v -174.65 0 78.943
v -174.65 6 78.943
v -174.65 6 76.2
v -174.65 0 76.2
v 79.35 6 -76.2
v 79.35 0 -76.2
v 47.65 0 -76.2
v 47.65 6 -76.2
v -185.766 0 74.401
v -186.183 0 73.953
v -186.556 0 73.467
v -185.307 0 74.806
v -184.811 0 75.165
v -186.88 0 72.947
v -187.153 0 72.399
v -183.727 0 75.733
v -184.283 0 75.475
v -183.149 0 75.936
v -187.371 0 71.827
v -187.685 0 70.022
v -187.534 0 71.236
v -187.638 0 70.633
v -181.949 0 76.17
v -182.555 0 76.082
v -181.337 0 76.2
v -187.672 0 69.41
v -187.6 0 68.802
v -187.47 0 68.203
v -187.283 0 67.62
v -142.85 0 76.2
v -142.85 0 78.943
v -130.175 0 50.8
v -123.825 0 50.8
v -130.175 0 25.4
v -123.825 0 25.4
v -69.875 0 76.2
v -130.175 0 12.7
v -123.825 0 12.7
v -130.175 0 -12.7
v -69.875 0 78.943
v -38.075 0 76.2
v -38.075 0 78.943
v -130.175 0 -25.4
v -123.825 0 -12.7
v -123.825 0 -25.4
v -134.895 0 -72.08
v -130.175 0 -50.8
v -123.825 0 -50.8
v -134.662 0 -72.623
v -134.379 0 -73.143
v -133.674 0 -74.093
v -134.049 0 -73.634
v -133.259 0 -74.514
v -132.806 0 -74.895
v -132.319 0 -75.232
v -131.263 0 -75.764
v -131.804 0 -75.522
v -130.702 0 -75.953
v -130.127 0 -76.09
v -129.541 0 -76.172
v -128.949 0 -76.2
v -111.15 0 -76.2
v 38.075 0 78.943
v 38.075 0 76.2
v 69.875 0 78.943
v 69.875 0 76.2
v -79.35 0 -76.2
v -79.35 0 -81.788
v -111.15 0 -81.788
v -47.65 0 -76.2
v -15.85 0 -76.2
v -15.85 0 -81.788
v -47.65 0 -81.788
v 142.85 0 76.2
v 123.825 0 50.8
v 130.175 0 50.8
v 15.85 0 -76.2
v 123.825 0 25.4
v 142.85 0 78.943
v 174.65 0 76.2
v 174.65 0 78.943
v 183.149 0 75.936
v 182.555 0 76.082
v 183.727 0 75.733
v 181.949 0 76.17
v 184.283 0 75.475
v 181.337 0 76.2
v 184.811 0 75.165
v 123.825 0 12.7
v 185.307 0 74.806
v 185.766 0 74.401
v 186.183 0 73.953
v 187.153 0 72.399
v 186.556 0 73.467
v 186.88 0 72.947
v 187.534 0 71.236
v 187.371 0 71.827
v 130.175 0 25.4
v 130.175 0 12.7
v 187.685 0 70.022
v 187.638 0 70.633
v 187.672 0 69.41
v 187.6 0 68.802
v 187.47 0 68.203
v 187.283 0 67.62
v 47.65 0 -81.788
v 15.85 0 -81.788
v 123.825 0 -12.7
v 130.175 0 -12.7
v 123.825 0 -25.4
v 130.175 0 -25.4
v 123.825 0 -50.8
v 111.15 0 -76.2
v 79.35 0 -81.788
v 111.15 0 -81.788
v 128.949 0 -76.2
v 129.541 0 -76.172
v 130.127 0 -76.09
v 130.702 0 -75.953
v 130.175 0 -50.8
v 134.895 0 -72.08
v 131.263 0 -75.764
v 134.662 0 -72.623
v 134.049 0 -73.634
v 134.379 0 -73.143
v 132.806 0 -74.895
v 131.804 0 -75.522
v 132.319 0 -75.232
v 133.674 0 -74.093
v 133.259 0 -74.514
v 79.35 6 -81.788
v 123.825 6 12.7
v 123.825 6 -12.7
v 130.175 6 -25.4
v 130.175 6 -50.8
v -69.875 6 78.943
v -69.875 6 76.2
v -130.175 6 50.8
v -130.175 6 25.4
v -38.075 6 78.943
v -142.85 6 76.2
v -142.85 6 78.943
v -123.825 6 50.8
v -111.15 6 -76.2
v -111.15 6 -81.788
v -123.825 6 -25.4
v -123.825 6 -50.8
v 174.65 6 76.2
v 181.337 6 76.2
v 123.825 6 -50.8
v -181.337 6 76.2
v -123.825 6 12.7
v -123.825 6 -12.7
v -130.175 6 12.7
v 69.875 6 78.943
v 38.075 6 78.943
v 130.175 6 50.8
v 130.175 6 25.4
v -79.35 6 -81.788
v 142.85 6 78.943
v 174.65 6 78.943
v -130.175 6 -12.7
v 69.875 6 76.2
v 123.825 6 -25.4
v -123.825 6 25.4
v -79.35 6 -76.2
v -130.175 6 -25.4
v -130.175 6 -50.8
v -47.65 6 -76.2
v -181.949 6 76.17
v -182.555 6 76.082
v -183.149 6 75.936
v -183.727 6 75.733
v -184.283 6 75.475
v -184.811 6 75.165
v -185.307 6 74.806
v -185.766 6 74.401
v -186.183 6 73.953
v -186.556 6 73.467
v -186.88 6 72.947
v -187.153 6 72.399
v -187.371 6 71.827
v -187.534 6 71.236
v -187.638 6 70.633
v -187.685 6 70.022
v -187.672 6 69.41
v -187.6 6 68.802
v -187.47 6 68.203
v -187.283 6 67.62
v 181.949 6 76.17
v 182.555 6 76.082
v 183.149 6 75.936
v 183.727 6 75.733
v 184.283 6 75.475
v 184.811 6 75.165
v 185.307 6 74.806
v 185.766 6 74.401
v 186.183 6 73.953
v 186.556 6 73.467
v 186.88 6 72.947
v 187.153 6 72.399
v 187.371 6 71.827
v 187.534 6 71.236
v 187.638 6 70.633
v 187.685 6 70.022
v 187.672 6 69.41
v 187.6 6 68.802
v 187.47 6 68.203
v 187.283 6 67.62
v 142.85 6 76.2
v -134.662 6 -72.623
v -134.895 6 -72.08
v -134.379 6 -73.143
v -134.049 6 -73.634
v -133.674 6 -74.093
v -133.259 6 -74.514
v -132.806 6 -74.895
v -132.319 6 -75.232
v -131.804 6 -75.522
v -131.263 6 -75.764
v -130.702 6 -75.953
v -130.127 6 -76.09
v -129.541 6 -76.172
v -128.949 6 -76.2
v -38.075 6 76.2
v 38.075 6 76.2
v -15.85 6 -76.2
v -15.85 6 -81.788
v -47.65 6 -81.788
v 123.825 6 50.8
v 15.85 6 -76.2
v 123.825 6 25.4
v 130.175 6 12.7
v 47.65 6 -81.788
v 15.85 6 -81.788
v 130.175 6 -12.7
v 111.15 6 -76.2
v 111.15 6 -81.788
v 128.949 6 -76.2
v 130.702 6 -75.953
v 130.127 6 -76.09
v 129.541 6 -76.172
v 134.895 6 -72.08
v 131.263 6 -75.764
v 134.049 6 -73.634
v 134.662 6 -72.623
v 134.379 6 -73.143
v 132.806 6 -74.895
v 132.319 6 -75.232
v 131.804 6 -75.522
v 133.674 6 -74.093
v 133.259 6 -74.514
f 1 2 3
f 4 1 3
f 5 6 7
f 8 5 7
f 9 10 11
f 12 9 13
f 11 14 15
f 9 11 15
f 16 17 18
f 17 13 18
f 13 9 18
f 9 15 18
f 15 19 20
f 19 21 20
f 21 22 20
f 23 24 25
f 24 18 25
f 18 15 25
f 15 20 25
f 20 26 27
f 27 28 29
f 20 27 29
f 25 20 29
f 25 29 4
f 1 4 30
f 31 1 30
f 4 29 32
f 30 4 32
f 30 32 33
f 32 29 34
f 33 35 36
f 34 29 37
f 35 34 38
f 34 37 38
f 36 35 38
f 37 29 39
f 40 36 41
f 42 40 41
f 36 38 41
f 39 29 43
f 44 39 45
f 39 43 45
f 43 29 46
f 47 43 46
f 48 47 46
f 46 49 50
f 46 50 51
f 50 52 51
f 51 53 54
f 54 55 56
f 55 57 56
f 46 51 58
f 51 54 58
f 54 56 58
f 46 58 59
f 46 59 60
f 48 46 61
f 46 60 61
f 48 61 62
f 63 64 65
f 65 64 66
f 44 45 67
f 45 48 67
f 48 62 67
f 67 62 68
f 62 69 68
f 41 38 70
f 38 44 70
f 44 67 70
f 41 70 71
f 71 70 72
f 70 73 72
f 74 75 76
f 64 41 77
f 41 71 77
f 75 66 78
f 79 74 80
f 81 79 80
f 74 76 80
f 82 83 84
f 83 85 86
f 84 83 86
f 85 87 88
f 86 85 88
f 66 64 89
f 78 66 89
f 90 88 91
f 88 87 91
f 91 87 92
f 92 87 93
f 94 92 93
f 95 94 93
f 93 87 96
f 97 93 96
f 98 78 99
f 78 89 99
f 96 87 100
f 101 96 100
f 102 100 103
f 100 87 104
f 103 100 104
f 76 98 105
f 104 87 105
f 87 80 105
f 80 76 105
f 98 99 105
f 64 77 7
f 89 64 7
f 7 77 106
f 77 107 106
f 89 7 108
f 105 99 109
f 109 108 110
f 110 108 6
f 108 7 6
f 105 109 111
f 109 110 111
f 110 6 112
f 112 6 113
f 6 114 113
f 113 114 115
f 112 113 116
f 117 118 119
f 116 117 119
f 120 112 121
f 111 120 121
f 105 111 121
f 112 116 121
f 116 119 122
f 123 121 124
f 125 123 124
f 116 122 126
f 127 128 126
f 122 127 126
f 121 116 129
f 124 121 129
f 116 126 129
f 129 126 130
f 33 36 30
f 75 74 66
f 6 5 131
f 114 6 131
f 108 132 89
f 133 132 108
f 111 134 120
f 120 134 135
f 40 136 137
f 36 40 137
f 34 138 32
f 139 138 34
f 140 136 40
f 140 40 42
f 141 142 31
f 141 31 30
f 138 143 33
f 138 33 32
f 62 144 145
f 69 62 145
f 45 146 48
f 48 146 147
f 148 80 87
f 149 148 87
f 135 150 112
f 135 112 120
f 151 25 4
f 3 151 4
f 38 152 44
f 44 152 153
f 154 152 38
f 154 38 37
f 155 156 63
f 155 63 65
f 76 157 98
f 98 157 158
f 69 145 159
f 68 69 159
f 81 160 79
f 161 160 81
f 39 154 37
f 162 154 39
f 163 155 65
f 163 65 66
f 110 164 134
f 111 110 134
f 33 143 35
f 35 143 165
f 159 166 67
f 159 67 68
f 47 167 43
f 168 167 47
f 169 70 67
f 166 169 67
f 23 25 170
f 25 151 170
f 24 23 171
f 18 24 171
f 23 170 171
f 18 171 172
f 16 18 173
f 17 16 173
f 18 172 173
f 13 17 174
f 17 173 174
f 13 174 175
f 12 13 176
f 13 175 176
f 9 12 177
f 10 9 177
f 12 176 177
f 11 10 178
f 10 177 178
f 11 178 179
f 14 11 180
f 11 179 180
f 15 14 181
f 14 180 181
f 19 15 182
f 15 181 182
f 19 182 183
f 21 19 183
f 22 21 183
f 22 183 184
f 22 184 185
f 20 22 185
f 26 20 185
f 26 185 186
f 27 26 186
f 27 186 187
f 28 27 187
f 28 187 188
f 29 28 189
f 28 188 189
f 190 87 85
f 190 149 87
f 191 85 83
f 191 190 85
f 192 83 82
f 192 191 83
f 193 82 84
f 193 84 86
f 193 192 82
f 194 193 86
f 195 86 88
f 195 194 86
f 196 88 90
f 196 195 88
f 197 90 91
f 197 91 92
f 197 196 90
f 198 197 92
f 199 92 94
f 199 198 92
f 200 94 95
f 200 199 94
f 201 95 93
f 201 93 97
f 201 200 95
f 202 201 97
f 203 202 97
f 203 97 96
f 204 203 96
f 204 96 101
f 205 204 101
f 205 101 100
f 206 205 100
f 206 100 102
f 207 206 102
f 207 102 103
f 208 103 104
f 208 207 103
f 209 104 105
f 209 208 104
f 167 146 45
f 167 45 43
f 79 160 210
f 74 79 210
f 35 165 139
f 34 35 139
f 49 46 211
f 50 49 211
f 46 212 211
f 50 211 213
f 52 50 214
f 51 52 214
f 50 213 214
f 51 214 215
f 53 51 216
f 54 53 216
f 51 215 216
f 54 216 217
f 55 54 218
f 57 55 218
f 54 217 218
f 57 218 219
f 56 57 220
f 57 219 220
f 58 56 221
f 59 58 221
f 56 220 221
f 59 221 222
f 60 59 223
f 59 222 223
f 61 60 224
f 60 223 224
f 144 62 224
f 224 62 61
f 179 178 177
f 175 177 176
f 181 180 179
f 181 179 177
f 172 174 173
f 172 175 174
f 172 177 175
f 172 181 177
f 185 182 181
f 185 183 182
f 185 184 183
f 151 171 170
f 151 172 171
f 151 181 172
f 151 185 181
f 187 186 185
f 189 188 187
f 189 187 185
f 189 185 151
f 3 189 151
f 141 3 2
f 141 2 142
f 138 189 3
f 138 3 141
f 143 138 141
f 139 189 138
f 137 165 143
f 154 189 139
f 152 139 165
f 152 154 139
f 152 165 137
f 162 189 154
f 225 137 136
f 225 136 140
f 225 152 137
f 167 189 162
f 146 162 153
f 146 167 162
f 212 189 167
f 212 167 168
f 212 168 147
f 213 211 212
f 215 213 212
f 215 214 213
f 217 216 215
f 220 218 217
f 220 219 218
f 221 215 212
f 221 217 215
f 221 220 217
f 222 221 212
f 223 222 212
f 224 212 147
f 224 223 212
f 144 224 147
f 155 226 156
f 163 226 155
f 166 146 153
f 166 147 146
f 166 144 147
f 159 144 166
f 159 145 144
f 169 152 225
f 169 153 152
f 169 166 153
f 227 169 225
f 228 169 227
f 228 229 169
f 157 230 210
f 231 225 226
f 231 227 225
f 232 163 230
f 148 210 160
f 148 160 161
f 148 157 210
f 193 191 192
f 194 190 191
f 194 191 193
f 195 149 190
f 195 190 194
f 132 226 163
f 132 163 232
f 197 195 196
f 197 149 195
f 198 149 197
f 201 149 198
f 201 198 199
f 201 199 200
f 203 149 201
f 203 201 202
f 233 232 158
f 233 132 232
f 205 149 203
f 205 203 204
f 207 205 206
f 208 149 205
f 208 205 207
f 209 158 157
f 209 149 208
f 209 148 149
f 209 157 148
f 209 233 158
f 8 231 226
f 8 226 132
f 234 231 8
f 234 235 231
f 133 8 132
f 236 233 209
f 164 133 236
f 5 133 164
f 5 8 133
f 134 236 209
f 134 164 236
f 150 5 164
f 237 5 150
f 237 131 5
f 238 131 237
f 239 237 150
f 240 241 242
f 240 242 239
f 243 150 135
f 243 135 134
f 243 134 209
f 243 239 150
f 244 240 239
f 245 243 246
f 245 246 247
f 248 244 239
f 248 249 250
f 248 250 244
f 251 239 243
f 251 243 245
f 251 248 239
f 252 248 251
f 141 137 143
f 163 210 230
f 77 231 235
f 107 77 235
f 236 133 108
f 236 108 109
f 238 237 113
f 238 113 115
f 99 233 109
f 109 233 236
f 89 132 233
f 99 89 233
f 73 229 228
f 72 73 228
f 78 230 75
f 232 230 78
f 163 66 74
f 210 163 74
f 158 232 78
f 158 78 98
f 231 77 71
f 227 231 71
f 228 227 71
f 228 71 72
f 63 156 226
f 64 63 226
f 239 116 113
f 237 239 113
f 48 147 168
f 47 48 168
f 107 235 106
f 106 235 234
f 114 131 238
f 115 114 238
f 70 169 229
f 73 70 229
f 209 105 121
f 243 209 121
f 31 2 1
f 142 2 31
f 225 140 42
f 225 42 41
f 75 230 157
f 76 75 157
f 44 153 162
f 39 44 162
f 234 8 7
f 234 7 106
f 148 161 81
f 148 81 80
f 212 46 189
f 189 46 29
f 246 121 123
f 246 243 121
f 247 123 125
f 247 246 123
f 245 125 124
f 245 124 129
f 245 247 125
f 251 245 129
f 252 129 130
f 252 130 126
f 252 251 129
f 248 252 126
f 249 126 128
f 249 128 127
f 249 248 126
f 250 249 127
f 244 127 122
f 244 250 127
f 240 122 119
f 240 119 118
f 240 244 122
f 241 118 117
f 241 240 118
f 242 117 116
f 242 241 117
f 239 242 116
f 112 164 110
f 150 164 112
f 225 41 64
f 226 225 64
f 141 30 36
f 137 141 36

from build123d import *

# Parameters (mm, degrees)
BOSS_EXTRUDE1_DEPTH = 6
SKETCH2_W           = 31.8008
SKETCH2_H           = 5.588
SKETCH2_H_2         = 2.7432
TABS_DEPTH          = 6
FILLET2_R           = 6.35
FILLET3_R           = 6.35
SKETCH5_W           = 6.35
SKETCH5_H           = 25.4
TAB_CUT_OUTS_DEPTH  = 6


with BuildPart() as part:
    # Sketch1 → Boss-Extrude1 (new body)
    with BuildSketch(Plane(origin=(0, 0, 0), x_dir=(1, 0, 0), z_dir=(0, 1, 0))):
        Polygon((-190.5, -76.2), (190.5, -76.2), (133.35, 76.2), (-133.35, 76.2), align=None)
    extrude(amount=BOSS_EXTRUDE1_DEPTH)

    # Sketch2 → Tabs (add)
    with BuildSketch(Plane(origin=(0, 6, 0), x_dir=(1, 0, 0), z_dir=(0, 1, 0))):
        with Locations((95.25, 78.994)):
            Rectangle(SKETCH2_W, SKETCH2_H)
        with Locations((-31.75, 78.994)):
            Rectangle(SKETCH2_W, SKETCH2_H)
        with Locations((-95.25, 78.994)):
            Rectangle(SKETCH2_W, SKETCH2_H)
        with Locations((31.75, 78.994)):
            Rectangle(SKETCH2_W, SKETCH2_H)
        with Locations((53.975, -77.5716)):
            Rectangle(SKETCH2_W, SKETCH2_H_2)
        with Locations((-53.975, -77.5716)):
            Rectangle(SKETCH2_W, SKETCH2_H_2)
        with Locations((-158.75, -77.5716)):
            Rectangle(SKETCH2_W, SKETCH2_H_2)
        with Locations((158.75, -77.5716)):
            Rectangle(SKETCH2_W, SKETCH2_H_2)
    extrude(amount=-TABS_DEPTH)

    # Fillet2
    fillet2_edges = [part.edges().sort_by_distance(p)[0] for p in [
        (190.5, 3, 76.2),
        (-190.5, 3, 76.2),
    ]]
    fillet(fillet2_edges, radius=FILLET2_R)

    # Fillet3
    fillet3_edges = [part.edges().sort_by_distance(p)[0] for p in [
        (-133.35, 3, -76.2),
        (133.35, 3, -76.2),
    ]]
    fillet(fillet3_edges, radius=FILLET3_R)

    # Sketch5 → Tab Cut Outs (cut)
    with BuildSketch(Plane(origin=(0, 6, 0), x_dir=(1, 0, 0), z_dir=(0, 1, 0))):
        with Locations((127, -38.1)):
            Rectangle(SKETCH5_W, SKETCH5_H)
        with Locations((127, 38.1)):
            Rectangle(SKETCH5_W, SKETCH5_H)
        with Locations((127, 0)):
            Rectangle(SKETCH5_W, SKETCH5_H)
    tab_cut_outs = extrude(amount=-TAB_CUT_OUTS_DEPTH, mode=Mode.SUBTRACT)

    # Mirror1: Tab Cut Outs across plane
    add(tab_cut_outs.mirror(Plane.ZY), mode=Mode.SUBTRACT)


solid = part.part
